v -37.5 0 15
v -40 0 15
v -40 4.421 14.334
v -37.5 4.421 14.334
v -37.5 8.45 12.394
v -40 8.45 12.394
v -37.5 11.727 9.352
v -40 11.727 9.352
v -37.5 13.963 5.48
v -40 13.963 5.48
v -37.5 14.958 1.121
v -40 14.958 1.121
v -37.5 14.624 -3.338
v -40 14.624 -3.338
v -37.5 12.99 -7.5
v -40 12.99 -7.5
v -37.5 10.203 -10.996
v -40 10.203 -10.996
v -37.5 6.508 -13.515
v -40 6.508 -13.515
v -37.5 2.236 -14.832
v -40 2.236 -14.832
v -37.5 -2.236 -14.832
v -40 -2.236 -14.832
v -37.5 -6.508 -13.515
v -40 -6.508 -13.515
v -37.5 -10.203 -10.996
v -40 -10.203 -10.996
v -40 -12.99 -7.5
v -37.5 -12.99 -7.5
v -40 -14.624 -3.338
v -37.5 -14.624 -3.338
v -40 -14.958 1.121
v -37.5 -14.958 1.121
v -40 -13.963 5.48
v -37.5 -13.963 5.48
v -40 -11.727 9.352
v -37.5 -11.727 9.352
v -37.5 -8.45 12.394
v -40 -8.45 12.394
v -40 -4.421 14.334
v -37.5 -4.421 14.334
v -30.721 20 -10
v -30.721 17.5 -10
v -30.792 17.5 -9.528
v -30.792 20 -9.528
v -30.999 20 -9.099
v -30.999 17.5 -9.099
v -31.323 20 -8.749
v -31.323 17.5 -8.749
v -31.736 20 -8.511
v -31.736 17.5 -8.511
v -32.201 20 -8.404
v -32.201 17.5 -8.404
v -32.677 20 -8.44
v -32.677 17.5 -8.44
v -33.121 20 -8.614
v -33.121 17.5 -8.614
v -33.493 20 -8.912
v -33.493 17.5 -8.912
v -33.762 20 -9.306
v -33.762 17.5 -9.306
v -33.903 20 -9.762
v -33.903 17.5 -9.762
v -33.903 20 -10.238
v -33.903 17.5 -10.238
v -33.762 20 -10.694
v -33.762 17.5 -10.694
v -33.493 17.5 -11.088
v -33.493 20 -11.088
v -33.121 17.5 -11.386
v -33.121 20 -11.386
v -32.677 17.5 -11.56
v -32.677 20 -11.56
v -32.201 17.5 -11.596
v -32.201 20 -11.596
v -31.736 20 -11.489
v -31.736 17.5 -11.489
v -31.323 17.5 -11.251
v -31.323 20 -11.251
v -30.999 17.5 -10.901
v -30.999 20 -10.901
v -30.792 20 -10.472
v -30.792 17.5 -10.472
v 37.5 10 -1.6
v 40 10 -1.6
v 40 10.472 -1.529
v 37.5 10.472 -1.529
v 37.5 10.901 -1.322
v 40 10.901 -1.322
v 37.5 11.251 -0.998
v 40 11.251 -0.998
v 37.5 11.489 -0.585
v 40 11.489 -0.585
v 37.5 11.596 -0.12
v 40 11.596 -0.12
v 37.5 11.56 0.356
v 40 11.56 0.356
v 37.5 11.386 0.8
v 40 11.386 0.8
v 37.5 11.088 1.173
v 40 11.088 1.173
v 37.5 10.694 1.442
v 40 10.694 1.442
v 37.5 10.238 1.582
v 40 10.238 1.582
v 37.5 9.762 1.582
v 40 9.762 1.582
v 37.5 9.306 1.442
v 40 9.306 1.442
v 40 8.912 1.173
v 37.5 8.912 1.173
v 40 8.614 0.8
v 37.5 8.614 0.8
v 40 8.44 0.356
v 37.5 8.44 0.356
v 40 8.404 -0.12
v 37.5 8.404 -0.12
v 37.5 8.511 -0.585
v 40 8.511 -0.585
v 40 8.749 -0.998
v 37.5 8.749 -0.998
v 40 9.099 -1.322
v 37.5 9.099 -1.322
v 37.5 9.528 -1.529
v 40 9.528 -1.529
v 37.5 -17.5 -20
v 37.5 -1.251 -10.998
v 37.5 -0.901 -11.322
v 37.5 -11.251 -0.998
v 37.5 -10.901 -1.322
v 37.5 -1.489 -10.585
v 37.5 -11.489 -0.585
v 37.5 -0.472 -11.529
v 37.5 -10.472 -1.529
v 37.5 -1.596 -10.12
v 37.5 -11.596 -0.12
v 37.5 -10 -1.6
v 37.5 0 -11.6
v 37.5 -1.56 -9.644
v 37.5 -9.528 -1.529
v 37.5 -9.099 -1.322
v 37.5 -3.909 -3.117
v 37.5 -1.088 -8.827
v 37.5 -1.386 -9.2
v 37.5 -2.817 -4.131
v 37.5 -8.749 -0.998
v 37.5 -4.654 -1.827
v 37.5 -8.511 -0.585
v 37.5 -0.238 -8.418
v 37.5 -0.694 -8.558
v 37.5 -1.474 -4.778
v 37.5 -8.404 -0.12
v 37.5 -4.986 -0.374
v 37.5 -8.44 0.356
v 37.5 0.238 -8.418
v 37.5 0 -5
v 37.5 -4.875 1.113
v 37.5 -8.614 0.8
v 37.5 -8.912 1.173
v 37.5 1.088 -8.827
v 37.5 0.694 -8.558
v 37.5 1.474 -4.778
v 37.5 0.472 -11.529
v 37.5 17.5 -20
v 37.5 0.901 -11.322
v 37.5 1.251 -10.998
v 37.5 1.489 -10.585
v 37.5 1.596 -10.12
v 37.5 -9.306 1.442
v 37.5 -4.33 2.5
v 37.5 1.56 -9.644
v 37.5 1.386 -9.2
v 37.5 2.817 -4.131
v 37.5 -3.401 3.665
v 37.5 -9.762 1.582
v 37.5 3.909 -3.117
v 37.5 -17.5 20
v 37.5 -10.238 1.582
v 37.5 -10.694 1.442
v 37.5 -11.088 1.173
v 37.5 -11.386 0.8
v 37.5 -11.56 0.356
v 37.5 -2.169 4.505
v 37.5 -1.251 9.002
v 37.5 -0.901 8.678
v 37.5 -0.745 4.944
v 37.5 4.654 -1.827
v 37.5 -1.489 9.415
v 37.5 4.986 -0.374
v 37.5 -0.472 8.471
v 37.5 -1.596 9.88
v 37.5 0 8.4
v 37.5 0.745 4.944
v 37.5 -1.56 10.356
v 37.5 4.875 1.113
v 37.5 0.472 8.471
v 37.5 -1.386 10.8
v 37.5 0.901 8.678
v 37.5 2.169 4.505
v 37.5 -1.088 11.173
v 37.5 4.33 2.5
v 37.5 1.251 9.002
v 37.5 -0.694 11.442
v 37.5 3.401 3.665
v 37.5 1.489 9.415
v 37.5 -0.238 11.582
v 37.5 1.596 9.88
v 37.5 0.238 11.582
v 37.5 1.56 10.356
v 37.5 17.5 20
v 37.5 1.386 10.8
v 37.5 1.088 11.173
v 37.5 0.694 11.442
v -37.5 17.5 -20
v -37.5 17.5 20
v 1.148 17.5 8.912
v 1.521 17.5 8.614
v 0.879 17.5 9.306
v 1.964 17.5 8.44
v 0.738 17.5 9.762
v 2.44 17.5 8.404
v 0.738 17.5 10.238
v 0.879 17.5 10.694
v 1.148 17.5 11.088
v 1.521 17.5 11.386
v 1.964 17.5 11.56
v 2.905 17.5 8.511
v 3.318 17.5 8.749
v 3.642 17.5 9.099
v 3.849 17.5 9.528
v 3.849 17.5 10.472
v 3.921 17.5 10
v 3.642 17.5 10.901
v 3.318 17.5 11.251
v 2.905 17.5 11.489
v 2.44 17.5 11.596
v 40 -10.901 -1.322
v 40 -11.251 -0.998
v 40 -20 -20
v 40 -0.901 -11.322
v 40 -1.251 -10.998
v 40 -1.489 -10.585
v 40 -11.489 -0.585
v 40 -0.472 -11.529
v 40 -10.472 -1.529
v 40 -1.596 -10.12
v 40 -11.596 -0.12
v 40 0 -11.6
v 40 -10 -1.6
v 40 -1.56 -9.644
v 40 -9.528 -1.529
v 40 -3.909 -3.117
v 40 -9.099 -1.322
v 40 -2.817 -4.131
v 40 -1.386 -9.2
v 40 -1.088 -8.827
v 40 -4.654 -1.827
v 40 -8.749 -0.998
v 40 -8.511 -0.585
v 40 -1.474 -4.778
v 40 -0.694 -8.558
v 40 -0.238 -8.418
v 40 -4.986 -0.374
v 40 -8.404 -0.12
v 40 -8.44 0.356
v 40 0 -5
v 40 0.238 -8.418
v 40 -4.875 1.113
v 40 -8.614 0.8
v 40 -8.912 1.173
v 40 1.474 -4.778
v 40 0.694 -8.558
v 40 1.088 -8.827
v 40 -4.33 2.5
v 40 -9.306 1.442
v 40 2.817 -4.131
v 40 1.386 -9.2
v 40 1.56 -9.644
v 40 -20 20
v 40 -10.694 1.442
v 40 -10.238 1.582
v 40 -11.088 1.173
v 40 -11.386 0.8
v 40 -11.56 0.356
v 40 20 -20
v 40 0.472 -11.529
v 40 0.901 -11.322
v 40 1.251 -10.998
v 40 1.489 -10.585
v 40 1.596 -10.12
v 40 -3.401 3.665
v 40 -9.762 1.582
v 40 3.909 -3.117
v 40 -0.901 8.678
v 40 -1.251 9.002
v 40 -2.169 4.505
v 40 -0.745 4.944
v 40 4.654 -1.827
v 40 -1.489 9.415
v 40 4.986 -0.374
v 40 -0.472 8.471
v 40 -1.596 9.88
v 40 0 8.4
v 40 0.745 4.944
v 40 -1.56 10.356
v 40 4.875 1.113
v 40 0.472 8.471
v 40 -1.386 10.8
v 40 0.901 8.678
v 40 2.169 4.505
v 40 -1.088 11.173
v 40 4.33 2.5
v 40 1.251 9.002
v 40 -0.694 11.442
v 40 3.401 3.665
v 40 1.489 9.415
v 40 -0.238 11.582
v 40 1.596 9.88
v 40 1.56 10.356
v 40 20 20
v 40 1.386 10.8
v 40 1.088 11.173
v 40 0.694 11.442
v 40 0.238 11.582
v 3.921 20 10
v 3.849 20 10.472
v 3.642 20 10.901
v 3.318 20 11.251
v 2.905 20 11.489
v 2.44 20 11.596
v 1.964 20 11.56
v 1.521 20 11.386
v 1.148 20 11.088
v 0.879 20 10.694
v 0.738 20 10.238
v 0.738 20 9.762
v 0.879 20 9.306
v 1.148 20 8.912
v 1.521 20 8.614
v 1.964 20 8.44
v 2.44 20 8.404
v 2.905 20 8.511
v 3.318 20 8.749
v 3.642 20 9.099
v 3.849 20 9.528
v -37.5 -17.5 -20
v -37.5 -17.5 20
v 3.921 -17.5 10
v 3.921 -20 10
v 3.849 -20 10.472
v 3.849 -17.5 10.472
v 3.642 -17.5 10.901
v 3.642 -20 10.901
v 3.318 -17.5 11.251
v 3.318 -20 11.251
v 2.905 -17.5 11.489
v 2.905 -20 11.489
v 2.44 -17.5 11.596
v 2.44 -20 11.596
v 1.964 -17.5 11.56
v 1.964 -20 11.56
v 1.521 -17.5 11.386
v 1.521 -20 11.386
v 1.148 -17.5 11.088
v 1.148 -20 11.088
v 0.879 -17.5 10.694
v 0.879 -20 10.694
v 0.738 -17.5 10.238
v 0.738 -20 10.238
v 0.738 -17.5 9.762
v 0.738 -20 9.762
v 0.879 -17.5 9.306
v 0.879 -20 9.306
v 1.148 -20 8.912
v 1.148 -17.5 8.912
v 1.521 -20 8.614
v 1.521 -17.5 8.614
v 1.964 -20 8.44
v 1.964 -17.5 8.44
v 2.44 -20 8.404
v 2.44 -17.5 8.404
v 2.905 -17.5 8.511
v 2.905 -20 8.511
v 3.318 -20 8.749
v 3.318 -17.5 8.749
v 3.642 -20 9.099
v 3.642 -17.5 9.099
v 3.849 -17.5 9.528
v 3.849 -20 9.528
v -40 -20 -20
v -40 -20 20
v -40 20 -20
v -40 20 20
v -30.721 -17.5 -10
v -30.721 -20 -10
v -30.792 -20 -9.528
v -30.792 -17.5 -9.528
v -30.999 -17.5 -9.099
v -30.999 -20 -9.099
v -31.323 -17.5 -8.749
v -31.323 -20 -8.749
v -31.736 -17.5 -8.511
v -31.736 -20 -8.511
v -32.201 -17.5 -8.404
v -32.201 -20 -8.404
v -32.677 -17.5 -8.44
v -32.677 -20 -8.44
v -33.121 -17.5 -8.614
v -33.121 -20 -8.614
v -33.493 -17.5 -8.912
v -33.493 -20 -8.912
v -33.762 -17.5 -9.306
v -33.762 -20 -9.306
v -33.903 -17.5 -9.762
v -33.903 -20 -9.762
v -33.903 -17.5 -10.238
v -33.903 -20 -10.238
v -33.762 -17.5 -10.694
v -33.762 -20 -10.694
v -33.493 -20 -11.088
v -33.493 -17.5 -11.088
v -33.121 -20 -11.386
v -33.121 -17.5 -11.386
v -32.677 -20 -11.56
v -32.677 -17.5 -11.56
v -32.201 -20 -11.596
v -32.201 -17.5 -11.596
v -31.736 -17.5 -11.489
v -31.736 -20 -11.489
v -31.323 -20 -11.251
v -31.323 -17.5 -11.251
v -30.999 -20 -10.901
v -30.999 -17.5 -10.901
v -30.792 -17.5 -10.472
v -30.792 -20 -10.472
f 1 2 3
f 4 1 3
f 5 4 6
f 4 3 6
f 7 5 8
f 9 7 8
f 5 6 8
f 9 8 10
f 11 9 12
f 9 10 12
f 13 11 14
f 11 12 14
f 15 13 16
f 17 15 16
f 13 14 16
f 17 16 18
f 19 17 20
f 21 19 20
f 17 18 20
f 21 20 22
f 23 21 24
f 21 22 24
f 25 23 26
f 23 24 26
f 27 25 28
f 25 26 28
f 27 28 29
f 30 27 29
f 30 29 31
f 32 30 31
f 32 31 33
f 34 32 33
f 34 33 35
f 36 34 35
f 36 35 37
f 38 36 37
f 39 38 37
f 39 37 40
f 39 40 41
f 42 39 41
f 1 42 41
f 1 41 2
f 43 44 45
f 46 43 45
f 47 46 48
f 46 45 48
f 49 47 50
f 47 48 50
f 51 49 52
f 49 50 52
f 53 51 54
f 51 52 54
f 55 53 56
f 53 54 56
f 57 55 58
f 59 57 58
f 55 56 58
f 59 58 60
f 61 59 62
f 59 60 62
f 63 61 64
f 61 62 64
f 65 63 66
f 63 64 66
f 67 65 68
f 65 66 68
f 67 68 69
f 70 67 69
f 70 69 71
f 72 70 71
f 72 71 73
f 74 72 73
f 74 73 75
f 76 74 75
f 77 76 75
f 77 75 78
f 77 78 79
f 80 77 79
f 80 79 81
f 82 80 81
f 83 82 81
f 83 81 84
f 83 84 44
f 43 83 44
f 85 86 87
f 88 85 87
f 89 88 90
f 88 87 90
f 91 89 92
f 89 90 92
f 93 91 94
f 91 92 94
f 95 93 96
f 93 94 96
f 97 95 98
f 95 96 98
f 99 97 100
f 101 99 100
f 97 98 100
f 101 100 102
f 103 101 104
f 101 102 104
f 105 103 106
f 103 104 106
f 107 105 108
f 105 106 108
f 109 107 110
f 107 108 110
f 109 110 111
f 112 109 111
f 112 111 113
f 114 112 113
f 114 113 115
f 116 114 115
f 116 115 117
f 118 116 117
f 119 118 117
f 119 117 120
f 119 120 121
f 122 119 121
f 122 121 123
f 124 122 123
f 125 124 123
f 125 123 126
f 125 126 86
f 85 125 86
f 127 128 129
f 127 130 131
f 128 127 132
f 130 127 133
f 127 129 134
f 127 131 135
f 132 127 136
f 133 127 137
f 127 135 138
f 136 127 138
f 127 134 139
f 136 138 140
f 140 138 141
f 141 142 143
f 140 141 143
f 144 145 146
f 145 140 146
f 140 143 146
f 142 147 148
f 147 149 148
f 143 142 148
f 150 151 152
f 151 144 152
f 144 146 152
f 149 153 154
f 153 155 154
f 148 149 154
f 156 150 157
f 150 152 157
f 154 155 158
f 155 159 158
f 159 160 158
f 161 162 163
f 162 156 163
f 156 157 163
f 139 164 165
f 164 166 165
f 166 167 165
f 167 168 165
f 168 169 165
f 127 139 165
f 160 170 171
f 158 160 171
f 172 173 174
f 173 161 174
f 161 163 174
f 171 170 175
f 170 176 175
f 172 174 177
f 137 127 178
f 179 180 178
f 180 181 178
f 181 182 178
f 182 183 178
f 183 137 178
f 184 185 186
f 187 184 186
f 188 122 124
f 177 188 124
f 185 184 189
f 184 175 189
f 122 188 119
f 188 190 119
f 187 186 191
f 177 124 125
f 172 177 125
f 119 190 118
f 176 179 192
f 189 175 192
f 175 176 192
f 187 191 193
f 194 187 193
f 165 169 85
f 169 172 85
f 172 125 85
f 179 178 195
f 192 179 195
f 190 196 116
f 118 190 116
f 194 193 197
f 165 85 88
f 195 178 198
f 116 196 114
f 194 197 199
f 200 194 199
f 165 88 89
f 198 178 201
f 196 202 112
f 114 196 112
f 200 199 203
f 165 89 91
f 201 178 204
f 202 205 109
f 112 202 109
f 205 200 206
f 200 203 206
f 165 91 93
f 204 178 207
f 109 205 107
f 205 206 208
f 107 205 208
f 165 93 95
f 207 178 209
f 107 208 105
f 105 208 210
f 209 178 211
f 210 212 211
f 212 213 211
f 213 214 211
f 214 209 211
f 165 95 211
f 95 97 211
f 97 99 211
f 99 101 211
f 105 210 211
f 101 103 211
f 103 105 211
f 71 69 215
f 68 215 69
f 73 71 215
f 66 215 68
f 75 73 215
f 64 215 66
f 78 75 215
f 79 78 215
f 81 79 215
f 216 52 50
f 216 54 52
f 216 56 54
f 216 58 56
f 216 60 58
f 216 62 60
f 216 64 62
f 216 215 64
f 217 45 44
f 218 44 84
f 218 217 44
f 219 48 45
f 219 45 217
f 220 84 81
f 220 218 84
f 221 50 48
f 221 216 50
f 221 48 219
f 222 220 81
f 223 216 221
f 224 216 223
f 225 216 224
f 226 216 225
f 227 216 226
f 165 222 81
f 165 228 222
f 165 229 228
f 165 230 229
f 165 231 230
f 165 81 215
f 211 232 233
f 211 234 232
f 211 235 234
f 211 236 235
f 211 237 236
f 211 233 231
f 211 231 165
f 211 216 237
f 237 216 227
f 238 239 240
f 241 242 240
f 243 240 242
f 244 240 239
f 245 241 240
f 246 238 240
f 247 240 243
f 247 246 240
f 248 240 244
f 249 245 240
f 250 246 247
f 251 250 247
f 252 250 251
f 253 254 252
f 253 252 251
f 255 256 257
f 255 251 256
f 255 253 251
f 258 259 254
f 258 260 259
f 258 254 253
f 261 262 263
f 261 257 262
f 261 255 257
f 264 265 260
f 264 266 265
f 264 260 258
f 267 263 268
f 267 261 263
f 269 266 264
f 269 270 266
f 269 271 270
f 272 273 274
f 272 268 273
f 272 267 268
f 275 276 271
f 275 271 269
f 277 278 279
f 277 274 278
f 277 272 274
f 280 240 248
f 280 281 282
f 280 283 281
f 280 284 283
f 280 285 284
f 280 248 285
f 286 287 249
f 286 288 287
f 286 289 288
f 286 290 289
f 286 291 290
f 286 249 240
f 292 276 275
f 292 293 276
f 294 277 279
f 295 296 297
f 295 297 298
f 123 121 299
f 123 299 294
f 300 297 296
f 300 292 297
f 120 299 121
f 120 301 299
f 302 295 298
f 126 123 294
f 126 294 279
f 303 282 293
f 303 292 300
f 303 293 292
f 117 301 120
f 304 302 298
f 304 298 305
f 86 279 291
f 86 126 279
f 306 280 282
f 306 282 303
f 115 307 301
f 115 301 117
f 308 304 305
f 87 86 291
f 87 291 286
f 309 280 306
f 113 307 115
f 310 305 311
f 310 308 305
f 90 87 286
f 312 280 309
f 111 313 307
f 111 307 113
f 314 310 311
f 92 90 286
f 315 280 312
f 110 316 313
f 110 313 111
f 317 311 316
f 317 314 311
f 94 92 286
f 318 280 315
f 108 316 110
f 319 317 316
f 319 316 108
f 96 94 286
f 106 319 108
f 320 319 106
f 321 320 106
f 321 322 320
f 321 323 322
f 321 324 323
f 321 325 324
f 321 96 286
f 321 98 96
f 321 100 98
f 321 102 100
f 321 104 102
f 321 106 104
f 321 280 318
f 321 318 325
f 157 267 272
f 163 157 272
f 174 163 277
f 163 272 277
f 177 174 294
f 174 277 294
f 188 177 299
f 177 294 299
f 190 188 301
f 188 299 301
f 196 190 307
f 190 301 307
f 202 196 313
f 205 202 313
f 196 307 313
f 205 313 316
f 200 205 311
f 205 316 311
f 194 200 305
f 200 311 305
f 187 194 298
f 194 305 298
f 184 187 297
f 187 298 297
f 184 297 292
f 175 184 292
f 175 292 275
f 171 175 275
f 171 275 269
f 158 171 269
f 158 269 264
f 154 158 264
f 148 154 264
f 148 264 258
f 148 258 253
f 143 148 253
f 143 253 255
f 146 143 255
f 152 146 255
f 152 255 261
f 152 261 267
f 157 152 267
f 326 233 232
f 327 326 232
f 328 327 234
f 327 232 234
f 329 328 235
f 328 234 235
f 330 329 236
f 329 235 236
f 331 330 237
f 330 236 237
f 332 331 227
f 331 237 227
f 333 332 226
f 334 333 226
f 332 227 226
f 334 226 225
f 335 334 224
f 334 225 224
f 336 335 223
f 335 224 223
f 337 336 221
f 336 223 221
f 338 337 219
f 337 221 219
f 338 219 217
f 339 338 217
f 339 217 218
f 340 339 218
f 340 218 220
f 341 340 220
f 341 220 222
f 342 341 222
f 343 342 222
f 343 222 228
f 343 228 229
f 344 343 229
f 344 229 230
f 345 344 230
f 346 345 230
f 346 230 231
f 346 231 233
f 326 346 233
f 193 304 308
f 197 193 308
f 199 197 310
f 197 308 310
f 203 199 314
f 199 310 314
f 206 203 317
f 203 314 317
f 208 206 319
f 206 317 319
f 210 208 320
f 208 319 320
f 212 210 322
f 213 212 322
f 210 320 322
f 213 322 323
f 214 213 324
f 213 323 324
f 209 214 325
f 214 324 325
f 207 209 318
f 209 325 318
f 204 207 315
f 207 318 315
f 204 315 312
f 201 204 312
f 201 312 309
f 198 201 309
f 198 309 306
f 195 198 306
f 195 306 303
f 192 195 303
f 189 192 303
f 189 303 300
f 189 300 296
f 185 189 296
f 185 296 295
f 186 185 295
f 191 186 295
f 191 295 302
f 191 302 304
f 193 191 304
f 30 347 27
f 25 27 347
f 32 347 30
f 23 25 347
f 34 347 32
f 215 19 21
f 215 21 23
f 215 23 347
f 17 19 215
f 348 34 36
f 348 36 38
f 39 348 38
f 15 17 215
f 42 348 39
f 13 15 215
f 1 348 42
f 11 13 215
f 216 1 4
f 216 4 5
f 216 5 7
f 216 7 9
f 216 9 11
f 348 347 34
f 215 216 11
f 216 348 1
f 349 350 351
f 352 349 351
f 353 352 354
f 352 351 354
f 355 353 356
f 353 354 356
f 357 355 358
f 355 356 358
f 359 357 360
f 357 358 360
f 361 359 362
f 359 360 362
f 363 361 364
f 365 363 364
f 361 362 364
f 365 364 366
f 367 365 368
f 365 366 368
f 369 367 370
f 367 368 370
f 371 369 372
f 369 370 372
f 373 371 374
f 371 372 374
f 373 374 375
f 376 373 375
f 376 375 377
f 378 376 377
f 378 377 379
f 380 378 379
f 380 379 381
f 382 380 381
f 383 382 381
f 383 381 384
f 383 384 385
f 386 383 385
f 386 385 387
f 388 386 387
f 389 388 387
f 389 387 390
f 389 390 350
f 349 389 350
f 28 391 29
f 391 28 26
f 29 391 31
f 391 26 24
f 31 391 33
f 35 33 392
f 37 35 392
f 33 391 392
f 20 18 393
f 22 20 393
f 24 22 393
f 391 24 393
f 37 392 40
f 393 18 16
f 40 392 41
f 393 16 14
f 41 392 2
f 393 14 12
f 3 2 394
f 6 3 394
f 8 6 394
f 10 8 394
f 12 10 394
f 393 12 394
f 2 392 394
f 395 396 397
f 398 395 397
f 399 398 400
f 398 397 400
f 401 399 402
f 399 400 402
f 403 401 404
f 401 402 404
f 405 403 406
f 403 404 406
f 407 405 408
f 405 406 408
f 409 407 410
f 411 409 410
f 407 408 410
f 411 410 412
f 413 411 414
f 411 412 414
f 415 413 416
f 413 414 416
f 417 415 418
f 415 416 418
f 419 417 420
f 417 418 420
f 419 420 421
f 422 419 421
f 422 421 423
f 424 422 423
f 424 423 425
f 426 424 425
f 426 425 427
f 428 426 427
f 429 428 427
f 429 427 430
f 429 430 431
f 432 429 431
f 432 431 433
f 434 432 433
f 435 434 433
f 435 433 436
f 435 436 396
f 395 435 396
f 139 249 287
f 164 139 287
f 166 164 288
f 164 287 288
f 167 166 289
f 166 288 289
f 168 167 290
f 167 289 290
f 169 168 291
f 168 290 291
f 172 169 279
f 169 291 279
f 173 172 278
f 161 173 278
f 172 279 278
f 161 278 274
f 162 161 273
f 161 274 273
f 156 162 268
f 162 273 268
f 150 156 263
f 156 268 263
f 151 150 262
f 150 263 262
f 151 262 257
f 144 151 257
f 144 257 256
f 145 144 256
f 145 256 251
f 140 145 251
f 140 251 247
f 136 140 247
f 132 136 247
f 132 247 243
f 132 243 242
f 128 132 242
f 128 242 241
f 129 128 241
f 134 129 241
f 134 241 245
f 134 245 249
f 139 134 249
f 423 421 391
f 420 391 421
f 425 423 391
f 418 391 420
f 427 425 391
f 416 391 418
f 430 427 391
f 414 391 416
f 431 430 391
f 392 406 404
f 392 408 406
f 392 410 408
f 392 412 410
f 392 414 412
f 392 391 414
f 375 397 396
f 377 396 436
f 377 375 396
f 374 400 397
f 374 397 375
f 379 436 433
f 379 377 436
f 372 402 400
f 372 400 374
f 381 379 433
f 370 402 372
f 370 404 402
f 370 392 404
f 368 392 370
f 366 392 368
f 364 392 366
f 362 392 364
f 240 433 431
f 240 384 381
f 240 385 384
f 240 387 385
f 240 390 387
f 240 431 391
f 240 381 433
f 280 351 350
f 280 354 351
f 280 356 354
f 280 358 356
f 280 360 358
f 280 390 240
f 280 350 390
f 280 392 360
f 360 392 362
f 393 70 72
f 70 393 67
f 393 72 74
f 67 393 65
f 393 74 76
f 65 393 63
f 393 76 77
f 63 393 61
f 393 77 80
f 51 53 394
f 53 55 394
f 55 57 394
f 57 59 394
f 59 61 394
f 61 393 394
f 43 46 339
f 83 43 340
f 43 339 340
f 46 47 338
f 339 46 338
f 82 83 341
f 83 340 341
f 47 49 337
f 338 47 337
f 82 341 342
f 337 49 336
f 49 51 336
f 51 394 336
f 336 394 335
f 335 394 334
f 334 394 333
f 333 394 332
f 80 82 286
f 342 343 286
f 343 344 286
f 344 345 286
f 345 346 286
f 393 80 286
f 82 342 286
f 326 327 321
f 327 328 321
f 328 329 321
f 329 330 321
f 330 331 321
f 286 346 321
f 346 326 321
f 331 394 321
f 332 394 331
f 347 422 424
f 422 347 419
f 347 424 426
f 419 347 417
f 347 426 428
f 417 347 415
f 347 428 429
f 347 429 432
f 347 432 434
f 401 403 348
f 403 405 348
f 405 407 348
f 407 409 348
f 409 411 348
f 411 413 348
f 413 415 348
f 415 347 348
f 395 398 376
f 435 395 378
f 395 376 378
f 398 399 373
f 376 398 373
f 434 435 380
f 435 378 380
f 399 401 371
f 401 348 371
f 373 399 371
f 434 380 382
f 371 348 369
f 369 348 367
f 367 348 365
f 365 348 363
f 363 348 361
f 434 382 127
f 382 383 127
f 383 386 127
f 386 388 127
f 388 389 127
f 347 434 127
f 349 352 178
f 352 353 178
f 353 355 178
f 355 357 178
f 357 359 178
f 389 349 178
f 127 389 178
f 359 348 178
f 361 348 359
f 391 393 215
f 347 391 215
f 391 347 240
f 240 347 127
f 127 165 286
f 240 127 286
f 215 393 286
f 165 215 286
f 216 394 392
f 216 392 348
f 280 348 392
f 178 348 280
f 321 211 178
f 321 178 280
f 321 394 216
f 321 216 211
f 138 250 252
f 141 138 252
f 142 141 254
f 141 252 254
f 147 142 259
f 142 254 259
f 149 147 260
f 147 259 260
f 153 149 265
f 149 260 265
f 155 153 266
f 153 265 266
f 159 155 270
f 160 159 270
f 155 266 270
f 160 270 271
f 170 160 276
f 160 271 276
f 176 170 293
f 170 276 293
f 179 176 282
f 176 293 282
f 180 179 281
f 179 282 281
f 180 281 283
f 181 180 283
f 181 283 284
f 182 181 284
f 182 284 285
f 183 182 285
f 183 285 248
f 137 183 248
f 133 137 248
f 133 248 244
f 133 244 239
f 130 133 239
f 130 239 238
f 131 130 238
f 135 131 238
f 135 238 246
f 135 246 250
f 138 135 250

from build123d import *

# Parameters (mm, degrees)
SKETCH_1_W          = 80
SKETCH_1_H          = 40
SKETCH_1_W_2        = 75
SKETCH_1_H_2        = 35
EXTRUDE_1_DEPTH     = 20
CUT_EXTRUDE_1_REACH = 82
SKETCH_3_R          = 1.6
SKETCH_3_R_2        = 5
CUT_EXTRUDE_2_REACH = 82
SKETCH_4_R          = 15
SKETCH_5_R          = 1.6
CUT_EXTRUDE_3_DEPTH = 41


with BuildPart() as part:
    # ｽｹｯﾁ1 → ﾎﾞｽ - 押し出し1 (new body, symmetric)
    with BuildSketch(Plane.XY):
        Rectangle(SKETCH_1_W, SKETCH_1_H)
        Rectangle(SKETCH_1_W_2, SKETCH_1_H_2, mode=Mode.SUBTRACT)
    extrude(amount=EXTRUDE_1_DEPTH, both=True)

    # ｽｹｯﾁ3 → ｶｯﾄ - 押し出し1 (cut, up to next)
    with BuildSketch(Plane(origin=(40, 0, 0), x_dir=(0, 0, -1), z_dir=(1, 0, 0)), mode=Mode.PRIVATE) as cut_extrude_1_sk1:
        with Locations((0, 10)):
            Circle(SKETCH_3_R)
    cut_extrude_1_tool1 = extrude(cut_extrude_1_sk1.sketch, amount=-CUT_EXTRUDE_1_REACH, mode=Mode.PRIVATE) & part.part
    add(cut_extrude_1_tool1.solids().sort_by_distance((40, 10, 0))[0], mode=Mode.SUBTRACT)
    # ｽｹｯﾁ3 → ｶｯﾄ - 押し出し1 (cut, up to next)
    with BuildSketch(Plane(origin=(40, 0, 0), x_dir=(0, 0, -1), z_dir=(1, 0, 0)), mode=Mode.PRIVATE) as cut_extrude_1_sk2:
        with Locations((10, 0)):
            Circle(SKETCH_3_R)
    cut_extrude_1_tool2 = extrude(cut_extrude_1_sk2.sketch, amount=-CUT_EXTRUDE_1_REACH, mode=Mode.PRIVATE) & part.part
    add(cut_extrude_1_tool2.solids().sort_by_distance((40, 0, -10))[0], mode=Mode.SUBTRACT)
    # ｽｹｯﾁ3 → ｶｯﾄ - 押し出し1 (cut, up to next)
    with BuildSketch(Plane(origin=(40, 0, 0), x_dir=(0, 0, -1), z_dir=(1, 0, 0)), mode=Mode.PRIVATE) as cut_extrude_1_sk3:
        with Locations((0, -10)):
            Circle(SKETCH_3_R)
    cut_extrude_1_tool3 = extrude(cut_extrude_1_sk3.sketch, amount=-CUT_EXTRUDE_1_REACH, mode=Mode.PRIVATE) & part.part
    add(cut_extrude_1_tool3.solids().sort_by_distance((40, -10, 0))[0], mode=Mode.SUBTRACT)
    # ｽｹｯﾁ3 → ｶｯﾄ - 押し出し1 (cut, up to next)
    with BuildSketch(Plane(origin=(40, 0, 0), x_dir=(0, 0, -1), z_dir=(1, 0, 0)), mode=Mode.PRIVATE) as cut_extrude_1_sk4:
        with Locations((-10, 0)):
            Circle(SKETCH_3_R)
    cut_extrude_1_tool4 = extrude(cut_extrude_1_sk4.sketch, amount=-CUT_EXTRUDE_1_REACH, mode=Mode.PRIVATE) & part.part
    add(cut_extrude_1_tool4.solids().sort_by_distance((40, 0, 10))[0], mode=Mode.SUBTRACT)
    # ｽｹｯﾁ3 → ｶｯﾄ - 押し出し1 (cut, up to next)
    with BuildSketch(Plane(origin=(40, 0, 0), x_dir=(0, 0, -1), z_dir=(1, 0, 0)), mode=Mode.PRIVATE) as cut_extrude_1_sk5:
        Circle(SKETCH_3_R_2)
    cut_extrude_1_tool5 = extrude(cut_extrude_1_sk5.sketch, amount=-CUT_EXTRUDE_1_REACH, mode=Mode.PRIVATE) & part.part
    add(cut_extrude_1_tool5.solids().sort_by_distance((40, 0, 0))[0], mode=Mode.SUBTRACT)

    # ｽｹｯﾁ4 → ｶｯﾄ - 押し出し2 (cut, up to next)
    with BuildSketch(Plane.ZY.offset(40), mode=Mode.PRIVATE) as cut_extrude_2_sk1:
        Circle(SKETCH_4_R)
    cut_extrude_2_tool1 = extrude(cut_extrude_2_sk1.sketch, amount=-CUT_EXTRUDE_2_REACH, mode=Mode.PRIVATE) & part.part
    add(cut_extrude_2_tool1.solids().sort_by_distance((-40, 0, 0))[0], mode=Mode.SUBTRACT)

    # ｽｹｯﾁ5 → ｶｯﾄ - 押し出し3 (cut, through all)
    with BuildSketch(Plane.XZ.offset(20)):
        with Locations((-32.320508076, -10)):
            Circle(SKETCH_5_R)
        with Locations((2.320508076, 10)):
            Circle(SKETCH_5_R)
    extrude(amount=-CUT_EXTRUDE_3_DEPTH, mode=Mode.SUBTRACT)


solid = part.part
